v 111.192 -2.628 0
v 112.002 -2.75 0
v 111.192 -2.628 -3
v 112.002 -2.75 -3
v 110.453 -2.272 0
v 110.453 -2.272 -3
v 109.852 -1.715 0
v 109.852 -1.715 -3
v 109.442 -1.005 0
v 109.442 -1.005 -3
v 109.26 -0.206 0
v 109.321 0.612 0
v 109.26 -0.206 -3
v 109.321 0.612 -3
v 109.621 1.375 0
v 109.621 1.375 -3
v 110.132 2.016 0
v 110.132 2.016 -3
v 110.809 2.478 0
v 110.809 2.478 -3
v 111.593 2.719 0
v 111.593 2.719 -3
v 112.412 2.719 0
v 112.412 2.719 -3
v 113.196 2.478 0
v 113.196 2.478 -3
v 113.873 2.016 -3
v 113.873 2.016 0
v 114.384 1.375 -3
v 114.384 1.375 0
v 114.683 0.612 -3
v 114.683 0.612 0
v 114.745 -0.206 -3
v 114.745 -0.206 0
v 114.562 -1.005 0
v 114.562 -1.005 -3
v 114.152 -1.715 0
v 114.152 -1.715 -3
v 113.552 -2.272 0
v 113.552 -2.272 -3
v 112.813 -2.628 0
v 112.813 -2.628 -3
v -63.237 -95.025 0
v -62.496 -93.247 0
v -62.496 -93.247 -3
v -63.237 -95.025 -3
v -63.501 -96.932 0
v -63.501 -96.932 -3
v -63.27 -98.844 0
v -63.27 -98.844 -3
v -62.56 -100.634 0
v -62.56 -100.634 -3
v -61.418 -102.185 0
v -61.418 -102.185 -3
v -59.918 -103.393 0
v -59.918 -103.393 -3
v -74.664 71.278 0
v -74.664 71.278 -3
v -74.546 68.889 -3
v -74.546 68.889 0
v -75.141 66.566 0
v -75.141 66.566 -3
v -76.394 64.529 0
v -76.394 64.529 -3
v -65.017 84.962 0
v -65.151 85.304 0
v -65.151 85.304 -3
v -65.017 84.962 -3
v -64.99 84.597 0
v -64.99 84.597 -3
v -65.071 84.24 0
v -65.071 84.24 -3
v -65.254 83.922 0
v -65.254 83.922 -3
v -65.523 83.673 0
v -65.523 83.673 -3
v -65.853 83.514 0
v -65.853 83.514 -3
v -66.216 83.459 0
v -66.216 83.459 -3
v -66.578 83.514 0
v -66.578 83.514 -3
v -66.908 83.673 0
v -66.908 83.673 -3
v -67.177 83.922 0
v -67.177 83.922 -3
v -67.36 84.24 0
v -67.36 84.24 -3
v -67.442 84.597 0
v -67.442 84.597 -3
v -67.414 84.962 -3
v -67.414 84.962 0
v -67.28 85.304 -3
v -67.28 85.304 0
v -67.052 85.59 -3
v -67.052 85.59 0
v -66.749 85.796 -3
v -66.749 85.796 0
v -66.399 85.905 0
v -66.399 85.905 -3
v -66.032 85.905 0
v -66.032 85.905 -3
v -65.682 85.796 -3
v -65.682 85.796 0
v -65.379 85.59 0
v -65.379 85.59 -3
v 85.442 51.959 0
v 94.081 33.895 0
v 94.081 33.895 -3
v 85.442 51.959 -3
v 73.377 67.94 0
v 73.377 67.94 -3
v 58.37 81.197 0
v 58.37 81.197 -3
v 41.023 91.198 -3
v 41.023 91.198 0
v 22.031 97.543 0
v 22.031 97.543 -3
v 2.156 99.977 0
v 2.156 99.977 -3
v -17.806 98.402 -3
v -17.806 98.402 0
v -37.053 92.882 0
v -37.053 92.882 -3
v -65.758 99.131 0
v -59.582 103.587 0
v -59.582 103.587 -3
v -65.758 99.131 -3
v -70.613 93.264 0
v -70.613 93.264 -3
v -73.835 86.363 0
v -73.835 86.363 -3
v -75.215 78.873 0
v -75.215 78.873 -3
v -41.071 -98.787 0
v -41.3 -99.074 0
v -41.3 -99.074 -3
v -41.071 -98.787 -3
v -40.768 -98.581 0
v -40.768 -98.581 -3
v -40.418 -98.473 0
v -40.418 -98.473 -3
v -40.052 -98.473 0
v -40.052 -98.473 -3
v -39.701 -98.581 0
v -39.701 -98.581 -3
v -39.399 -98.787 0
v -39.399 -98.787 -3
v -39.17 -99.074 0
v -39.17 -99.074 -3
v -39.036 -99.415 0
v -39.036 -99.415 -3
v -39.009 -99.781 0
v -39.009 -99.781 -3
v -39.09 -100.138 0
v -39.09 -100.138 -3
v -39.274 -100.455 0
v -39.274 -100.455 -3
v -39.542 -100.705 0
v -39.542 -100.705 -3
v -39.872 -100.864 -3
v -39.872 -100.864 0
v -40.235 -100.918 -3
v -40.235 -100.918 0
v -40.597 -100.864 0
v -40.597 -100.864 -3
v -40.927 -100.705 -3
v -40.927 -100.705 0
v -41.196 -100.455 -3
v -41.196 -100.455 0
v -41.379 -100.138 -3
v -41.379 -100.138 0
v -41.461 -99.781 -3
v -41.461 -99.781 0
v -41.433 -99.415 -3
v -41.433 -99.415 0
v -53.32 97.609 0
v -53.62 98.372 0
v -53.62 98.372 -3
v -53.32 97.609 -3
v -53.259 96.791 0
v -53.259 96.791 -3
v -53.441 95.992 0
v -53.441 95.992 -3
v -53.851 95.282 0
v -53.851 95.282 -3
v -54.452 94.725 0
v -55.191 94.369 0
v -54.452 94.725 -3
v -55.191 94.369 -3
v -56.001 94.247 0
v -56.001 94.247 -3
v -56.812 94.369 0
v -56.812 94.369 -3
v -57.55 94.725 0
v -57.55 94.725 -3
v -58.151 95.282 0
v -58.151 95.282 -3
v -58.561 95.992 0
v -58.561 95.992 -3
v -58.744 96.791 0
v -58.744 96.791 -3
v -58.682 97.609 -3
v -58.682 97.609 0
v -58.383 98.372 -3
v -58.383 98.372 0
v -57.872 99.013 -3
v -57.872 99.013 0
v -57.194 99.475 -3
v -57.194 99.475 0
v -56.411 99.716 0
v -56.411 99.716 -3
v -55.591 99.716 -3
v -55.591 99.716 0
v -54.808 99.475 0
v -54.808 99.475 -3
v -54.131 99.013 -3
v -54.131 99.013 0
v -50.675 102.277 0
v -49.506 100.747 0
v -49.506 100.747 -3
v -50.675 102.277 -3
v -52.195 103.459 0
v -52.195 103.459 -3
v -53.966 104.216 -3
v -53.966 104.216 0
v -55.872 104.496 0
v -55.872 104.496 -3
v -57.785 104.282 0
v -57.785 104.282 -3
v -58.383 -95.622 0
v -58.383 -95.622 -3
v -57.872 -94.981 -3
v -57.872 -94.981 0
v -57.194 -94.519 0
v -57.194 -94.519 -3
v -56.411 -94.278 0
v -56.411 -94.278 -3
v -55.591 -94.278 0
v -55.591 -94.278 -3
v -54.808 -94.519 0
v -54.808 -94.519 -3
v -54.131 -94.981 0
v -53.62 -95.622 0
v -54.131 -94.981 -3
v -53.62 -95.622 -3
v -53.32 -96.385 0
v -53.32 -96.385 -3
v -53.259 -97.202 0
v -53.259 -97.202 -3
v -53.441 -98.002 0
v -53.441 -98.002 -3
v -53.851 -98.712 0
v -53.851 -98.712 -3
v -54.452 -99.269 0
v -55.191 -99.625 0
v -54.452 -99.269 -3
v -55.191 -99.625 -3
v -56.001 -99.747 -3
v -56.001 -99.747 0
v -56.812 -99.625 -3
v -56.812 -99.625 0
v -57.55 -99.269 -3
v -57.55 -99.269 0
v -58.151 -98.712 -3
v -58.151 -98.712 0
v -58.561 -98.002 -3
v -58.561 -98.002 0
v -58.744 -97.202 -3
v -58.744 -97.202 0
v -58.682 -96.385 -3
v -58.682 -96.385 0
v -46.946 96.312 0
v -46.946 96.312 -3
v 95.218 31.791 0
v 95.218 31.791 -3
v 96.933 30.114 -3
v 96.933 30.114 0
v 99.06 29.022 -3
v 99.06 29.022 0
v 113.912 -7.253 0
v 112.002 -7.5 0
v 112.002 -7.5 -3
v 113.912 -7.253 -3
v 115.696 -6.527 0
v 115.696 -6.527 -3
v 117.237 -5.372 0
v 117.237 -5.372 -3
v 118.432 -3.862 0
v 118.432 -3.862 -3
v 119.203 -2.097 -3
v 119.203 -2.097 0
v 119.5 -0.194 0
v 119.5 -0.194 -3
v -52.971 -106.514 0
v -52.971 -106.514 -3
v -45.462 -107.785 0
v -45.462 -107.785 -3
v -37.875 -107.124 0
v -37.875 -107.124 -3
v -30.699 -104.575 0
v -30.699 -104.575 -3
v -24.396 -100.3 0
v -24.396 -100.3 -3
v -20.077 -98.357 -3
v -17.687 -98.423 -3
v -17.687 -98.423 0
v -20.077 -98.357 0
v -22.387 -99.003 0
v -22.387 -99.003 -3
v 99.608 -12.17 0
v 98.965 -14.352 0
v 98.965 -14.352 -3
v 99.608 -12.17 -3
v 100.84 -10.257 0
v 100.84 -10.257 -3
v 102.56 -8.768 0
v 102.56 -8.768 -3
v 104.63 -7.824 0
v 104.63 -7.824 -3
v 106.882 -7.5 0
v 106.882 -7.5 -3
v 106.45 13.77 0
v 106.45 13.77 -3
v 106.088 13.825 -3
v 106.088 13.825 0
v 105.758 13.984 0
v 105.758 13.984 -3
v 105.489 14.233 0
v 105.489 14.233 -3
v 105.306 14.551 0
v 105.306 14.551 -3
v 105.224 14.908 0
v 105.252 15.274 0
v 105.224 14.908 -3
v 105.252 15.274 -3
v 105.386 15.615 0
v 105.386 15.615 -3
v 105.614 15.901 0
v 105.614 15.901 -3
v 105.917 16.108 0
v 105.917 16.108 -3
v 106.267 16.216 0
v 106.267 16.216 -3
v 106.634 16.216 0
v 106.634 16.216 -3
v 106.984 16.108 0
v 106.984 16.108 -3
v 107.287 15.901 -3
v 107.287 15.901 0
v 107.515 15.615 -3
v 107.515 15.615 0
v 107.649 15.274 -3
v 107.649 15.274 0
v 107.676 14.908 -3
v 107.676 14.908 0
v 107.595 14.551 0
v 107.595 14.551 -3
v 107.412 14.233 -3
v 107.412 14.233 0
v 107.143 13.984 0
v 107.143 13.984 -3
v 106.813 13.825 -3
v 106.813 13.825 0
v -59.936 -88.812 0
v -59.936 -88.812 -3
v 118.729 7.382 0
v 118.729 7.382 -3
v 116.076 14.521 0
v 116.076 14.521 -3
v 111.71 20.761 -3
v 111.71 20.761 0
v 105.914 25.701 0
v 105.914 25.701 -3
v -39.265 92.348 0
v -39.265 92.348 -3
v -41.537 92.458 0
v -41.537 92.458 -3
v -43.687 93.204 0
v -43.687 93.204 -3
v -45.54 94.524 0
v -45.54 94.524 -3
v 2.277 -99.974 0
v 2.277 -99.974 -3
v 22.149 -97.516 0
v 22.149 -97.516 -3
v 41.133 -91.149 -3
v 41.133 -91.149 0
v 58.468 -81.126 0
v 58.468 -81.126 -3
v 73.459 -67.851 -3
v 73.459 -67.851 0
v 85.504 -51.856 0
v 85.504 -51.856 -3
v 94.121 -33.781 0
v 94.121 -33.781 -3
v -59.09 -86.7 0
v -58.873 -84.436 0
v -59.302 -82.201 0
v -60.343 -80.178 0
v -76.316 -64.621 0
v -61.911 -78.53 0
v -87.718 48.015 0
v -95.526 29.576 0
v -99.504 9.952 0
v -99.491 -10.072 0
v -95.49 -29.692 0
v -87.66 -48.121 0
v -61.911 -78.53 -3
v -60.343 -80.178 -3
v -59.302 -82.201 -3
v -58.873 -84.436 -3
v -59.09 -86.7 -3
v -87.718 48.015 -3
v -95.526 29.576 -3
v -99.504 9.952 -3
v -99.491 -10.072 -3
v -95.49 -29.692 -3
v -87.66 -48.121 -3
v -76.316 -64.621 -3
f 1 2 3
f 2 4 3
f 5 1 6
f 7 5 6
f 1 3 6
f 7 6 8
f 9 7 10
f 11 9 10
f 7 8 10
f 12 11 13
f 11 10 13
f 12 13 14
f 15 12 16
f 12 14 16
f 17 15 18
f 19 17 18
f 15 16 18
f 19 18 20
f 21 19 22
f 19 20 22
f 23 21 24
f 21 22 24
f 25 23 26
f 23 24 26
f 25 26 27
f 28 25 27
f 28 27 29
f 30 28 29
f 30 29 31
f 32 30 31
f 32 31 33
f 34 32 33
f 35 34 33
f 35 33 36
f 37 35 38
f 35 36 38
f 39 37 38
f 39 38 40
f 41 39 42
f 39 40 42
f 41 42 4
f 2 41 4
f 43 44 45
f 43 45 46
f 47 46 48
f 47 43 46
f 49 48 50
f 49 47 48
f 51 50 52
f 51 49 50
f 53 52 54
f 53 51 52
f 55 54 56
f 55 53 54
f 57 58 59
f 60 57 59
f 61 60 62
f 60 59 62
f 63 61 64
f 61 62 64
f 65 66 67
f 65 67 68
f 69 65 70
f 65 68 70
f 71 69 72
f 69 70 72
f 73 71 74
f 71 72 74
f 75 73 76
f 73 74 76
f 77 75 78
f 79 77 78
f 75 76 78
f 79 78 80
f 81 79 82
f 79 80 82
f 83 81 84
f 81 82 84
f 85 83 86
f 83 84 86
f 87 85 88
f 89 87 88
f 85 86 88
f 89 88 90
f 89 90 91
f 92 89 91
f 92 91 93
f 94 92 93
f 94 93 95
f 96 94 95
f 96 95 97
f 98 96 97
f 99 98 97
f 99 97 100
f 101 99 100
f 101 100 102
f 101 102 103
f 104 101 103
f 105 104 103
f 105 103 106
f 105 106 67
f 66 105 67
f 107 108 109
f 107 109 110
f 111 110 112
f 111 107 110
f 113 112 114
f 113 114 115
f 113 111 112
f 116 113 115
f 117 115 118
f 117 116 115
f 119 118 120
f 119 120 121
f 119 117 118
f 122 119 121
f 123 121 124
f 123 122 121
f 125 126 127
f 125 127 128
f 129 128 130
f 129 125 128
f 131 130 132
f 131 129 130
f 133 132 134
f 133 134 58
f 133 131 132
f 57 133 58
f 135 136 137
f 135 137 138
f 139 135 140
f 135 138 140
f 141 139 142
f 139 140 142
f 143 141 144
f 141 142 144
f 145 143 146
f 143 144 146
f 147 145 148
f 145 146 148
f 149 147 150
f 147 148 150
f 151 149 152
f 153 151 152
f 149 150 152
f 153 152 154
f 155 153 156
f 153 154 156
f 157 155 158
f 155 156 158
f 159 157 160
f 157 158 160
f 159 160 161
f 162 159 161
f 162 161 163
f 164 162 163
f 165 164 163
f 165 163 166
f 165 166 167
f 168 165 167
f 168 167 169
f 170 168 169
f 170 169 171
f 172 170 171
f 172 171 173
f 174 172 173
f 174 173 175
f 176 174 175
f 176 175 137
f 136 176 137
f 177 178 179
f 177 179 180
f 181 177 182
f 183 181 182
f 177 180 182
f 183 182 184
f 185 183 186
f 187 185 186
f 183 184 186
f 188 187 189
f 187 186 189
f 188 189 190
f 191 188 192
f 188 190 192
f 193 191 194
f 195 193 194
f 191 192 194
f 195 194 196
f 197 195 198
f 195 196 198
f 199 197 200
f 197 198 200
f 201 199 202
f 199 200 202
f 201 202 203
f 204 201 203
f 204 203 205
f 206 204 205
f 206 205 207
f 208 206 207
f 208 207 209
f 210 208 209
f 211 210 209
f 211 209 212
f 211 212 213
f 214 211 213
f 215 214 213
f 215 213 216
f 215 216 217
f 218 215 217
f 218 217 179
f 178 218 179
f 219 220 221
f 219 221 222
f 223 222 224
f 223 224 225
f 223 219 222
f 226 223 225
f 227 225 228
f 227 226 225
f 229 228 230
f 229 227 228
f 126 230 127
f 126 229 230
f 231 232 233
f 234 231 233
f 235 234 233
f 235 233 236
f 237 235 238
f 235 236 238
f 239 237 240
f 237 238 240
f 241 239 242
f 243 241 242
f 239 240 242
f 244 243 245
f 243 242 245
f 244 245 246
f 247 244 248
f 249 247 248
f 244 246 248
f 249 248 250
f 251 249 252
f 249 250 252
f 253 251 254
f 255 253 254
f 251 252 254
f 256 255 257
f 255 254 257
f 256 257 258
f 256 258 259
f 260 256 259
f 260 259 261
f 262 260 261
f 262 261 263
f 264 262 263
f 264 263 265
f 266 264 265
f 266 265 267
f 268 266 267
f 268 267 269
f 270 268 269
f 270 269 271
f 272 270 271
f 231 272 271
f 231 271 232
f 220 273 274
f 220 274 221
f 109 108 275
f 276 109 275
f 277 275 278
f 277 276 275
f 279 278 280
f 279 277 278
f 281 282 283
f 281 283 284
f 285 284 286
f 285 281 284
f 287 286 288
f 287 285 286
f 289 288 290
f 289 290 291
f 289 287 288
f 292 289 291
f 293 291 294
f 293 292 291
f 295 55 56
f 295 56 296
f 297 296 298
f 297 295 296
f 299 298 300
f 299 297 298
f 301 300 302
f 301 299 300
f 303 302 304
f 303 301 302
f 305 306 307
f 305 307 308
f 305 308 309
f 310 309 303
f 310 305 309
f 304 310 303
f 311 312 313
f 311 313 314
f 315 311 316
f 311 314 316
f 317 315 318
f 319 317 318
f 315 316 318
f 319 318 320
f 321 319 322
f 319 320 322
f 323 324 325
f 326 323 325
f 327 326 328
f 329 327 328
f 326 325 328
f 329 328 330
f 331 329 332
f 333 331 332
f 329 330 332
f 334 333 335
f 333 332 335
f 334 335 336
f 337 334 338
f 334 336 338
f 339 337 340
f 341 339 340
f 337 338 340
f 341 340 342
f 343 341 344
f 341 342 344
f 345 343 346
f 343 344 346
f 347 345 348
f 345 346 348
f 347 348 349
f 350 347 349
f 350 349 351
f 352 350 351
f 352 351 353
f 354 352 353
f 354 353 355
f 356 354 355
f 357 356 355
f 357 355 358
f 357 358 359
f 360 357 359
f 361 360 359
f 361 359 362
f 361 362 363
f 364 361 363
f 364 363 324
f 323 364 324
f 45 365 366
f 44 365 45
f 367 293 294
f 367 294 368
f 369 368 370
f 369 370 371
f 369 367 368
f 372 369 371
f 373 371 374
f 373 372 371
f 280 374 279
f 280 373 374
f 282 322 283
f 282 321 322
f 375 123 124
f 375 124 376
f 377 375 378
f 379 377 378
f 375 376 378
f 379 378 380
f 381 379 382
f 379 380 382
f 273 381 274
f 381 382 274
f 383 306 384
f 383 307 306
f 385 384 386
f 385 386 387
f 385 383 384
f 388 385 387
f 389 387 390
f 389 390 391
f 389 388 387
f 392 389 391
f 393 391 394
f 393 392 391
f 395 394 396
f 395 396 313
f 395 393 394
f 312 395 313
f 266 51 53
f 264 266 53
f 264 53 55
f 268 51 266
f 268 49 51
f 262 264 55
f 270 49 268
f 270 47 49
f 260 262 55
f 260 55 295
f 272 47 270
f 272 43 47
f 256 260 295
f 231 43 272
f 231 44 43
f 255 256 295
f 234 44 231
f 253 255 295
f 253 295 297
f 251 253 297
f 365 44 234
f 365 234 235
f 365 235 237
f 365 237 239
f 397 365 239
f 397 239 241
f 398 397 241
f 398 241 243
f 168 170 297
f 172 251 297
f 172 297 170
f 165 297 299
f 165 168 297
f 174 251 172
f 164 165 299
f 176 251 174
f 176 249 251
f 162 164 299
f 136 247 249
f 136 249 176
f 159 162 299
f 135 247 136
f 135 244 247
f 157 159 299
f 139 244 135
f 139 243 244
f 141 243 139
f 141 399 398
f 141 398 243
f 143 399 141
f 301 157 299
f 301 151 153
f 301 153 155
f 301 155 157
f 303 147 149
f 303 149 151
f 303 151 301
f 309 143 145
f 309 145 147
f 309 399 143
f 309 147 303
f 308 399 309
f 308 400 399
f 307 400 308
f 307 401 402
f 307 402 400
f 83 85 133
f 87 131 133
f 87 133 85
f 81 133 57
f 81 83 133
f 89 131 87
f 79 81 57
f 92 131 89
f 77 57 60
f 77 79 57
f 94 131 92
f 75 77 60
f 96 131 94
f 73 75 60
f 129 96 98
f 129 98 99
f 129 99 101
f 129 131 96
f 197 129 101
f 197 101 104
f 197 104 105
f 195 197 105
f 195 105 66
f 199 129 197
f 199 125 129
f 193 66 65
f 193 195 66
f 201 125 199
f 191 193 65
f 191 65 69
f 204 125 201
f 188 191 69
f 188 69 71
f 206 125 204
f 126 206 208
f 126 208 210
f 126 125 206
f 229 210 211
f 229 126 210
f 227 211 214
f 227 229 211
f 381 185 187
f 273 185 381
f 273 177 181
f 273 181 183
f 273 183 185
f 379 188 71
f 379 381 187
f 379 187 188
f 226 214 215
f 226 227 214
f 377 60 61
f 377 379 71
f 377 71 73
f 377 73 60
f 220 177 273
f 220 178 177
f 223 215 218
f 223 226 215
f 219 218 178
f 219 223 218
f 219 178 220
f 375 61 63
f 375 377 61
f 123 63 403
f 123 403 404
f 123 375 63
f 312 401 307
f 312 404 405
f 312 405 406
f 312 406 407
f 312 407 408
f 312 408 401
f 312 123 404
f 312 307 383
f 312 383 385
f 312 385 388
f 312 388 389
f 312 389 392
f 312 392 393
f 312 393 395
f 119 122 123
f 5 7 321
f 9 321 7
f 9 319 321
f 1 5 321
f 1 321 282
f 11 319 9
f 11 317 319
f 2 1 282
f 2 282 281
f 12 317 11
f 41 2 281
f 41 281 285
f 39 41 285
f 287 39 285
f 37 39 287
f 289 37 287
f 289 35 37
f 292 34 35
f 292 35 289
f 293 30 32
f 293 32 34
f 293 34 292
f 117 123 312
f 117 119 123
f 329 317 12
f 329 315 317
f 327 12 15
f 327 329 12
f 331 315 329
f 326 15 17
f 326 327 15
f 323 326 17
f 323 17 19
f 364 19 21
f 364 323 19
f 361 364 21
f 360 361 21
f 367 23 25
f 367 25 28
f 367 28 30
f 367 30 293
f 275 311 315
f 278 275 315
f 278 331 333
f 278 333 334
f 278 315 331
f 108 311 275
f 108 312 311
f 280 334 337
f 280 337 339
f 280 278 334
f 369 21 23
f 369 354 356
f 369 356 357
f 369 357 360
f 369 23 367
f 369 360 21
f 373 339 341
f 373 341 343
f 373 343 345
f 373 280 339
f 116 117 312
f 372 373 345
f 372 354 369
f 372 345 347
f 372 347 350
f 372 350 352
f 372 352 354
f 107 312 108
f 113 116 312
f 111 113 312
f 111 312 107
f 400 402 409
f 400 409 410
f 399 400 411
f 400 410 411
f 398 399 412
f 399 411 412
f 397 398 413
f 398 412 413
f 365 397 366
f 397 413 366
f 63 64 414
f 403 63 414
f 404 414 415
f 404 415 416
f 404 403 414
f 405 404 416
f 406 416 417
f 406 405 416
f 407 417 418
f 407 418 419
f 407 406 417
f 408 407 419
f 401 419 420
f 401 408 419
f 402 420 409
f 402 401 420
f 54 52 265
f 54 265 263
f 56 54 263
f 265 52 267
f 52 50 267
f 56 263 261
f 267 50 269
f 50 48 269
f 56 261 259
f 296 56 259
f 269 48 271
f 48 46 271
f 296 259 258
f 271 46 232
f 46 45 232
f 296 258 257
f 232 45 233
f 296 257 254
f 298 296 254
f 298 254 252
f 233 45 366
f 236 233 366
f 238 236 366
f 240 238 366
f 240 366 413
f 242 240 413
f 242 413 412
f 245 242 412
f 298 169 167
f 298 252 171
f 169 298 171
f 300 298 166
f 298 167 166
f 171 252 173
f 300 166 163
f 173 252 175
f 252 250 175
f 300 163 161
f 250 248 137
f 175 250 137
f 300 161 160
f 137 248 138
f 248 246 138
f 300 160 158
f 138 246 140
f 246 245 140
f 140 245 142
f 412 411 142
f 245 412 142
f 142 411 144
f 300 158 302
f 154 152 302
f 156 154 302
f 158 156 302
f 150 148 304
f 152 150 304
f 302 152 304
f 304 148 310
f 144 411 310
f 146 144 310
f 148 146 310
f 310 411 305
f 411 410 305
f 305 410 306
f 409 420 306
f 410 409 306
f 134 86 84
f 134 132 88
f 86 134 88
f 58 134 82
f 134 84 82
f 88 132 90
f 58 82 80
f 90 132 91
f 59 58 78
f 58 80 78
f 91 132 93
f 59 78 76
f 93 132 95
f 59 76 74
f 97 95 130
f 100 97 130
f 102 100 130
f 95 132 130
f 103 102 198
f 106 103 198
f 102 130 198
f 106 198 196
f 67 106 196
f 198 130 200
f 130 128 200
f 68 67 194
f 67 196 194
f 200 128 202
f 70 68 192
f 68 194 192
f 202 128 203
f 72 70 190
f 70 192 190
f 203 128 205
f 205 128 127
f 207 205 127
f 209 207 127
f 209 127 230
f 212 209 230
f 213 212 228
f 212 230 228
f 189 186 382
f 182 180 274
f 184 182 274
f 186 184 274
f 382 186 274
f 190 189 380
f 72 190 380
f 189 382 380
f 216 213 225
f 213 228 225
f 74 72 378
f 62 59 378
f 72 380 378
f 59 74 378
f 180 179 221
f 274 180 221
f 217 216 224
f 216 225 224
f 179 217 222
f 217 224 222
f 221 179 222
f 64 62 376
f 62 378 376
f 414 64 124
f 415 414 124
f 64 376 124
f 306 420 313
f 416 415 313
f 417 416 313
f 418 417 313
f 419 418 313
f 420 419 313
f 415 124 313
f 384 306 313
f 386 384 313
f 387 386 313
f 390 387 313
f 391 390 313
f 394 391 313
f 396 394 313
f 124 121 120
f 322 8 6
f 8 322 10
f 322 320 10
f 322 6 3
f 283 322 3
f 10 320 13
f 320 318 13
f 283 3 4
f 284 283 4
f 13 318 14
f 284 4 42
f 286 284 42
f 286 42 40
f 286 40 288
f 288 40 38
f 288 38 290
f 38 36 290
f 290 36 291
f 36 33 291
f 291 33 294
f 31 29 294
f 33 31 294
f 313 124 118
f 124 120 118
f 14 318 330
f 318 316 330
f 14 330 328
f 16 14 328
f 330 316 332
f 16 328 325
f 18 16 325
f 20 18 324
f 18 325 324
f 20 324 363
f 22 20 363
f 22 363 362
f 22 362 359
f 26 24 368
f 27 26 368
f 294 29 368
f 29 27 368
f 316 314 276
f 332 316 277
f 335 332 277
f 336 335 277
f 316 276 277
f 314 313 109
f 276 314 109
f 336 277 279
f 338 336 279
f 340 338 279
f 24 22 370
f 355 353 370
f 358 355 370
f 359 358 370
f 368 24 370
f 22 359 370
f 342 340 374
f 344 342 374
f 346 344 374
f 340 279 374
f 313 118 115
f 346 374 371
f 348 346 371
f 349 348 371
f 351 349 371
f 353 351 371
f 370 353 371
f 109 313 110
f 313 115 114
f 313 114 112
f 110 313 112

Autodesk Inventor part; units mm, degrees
ref_plane "YZ Plane" through (0, 0, 0) normal (1, 0, 0) x (0, 1, 0)
ref_plane "XZ Plane" through (0, 0, 0) normal (0, 1, 0) x (-1, 0, 0)
ref_plane "XY Plane" through (0, 0, 0) normal (0, 0, 1) x (1, 0, 0)
sketch "Esquisse2" plane through (0, 0, 0) normal (0, 0, 1) x (1, 0, 0)
  circle A0 centre (0, 0) radius 100
  dimension "Diamètre" = 200
extrude "Embase" add sketch "Esquisse2" against normal blind 3
sketch "Esquisse1" plane through (0, 0, 0) normal (0, 0, 1) x (1, 0, 0)
  arc A0 (99.7184, -7.5) -> (95.3938, 30.0004) centre (0, 0) ccw
  arc A1 (119.4999, -0.1943) -> (95.3938, 30.0004) centre (89.51, 0.583) ccw
  line L0 (99.7184, -7.5) -> (112.0024, -7.5)
  arc A2 (112.0024, -7.5) -> (119.4999, -0.1943) centre (112.0024, 0) ccw
  point P0 (106.4504, 15)
  point P1 (106.4504, 15)
  dimension "d0" = 200
  dimension "d1" = 60
  dimension "d2" = 89.51
  dimension "d3" = 0.583
  dimension "d4" = 7.5
  dimension "d5" = 15
  dimension "d9" = 15
  dimension "d10" = 5.552
extrude "Oreille" add sketch "Esquisse1" against normal up to surface (3 mm away)
hole "M3" at (106.4504, 15, 0) direction (0, 0, -1) diameter 2.459 depth 8.8 tip angle 118 thread size "M3x0.5" class "6H" standard "ISO Metric profile"
hole "Passage vis" at (112.0024, 0, 0) direction (0, 0, -1) diameter 5.5 end through all
fillet "Congé1" radius 8 2 edges at (99.7184, -7.5, -1.5) (95.3938, 30.0004, -1.5)
pattern_circular "Réseau circulaire1" count 3 over 360 about axis through (0, 0, -10) along (0, 0, 1) of "Congé1", "Passage vis", "M3", "Oreille"
equation "\"d0\" = Diamètre"
properties part number "Plateau metalique" material "Aluminium"
